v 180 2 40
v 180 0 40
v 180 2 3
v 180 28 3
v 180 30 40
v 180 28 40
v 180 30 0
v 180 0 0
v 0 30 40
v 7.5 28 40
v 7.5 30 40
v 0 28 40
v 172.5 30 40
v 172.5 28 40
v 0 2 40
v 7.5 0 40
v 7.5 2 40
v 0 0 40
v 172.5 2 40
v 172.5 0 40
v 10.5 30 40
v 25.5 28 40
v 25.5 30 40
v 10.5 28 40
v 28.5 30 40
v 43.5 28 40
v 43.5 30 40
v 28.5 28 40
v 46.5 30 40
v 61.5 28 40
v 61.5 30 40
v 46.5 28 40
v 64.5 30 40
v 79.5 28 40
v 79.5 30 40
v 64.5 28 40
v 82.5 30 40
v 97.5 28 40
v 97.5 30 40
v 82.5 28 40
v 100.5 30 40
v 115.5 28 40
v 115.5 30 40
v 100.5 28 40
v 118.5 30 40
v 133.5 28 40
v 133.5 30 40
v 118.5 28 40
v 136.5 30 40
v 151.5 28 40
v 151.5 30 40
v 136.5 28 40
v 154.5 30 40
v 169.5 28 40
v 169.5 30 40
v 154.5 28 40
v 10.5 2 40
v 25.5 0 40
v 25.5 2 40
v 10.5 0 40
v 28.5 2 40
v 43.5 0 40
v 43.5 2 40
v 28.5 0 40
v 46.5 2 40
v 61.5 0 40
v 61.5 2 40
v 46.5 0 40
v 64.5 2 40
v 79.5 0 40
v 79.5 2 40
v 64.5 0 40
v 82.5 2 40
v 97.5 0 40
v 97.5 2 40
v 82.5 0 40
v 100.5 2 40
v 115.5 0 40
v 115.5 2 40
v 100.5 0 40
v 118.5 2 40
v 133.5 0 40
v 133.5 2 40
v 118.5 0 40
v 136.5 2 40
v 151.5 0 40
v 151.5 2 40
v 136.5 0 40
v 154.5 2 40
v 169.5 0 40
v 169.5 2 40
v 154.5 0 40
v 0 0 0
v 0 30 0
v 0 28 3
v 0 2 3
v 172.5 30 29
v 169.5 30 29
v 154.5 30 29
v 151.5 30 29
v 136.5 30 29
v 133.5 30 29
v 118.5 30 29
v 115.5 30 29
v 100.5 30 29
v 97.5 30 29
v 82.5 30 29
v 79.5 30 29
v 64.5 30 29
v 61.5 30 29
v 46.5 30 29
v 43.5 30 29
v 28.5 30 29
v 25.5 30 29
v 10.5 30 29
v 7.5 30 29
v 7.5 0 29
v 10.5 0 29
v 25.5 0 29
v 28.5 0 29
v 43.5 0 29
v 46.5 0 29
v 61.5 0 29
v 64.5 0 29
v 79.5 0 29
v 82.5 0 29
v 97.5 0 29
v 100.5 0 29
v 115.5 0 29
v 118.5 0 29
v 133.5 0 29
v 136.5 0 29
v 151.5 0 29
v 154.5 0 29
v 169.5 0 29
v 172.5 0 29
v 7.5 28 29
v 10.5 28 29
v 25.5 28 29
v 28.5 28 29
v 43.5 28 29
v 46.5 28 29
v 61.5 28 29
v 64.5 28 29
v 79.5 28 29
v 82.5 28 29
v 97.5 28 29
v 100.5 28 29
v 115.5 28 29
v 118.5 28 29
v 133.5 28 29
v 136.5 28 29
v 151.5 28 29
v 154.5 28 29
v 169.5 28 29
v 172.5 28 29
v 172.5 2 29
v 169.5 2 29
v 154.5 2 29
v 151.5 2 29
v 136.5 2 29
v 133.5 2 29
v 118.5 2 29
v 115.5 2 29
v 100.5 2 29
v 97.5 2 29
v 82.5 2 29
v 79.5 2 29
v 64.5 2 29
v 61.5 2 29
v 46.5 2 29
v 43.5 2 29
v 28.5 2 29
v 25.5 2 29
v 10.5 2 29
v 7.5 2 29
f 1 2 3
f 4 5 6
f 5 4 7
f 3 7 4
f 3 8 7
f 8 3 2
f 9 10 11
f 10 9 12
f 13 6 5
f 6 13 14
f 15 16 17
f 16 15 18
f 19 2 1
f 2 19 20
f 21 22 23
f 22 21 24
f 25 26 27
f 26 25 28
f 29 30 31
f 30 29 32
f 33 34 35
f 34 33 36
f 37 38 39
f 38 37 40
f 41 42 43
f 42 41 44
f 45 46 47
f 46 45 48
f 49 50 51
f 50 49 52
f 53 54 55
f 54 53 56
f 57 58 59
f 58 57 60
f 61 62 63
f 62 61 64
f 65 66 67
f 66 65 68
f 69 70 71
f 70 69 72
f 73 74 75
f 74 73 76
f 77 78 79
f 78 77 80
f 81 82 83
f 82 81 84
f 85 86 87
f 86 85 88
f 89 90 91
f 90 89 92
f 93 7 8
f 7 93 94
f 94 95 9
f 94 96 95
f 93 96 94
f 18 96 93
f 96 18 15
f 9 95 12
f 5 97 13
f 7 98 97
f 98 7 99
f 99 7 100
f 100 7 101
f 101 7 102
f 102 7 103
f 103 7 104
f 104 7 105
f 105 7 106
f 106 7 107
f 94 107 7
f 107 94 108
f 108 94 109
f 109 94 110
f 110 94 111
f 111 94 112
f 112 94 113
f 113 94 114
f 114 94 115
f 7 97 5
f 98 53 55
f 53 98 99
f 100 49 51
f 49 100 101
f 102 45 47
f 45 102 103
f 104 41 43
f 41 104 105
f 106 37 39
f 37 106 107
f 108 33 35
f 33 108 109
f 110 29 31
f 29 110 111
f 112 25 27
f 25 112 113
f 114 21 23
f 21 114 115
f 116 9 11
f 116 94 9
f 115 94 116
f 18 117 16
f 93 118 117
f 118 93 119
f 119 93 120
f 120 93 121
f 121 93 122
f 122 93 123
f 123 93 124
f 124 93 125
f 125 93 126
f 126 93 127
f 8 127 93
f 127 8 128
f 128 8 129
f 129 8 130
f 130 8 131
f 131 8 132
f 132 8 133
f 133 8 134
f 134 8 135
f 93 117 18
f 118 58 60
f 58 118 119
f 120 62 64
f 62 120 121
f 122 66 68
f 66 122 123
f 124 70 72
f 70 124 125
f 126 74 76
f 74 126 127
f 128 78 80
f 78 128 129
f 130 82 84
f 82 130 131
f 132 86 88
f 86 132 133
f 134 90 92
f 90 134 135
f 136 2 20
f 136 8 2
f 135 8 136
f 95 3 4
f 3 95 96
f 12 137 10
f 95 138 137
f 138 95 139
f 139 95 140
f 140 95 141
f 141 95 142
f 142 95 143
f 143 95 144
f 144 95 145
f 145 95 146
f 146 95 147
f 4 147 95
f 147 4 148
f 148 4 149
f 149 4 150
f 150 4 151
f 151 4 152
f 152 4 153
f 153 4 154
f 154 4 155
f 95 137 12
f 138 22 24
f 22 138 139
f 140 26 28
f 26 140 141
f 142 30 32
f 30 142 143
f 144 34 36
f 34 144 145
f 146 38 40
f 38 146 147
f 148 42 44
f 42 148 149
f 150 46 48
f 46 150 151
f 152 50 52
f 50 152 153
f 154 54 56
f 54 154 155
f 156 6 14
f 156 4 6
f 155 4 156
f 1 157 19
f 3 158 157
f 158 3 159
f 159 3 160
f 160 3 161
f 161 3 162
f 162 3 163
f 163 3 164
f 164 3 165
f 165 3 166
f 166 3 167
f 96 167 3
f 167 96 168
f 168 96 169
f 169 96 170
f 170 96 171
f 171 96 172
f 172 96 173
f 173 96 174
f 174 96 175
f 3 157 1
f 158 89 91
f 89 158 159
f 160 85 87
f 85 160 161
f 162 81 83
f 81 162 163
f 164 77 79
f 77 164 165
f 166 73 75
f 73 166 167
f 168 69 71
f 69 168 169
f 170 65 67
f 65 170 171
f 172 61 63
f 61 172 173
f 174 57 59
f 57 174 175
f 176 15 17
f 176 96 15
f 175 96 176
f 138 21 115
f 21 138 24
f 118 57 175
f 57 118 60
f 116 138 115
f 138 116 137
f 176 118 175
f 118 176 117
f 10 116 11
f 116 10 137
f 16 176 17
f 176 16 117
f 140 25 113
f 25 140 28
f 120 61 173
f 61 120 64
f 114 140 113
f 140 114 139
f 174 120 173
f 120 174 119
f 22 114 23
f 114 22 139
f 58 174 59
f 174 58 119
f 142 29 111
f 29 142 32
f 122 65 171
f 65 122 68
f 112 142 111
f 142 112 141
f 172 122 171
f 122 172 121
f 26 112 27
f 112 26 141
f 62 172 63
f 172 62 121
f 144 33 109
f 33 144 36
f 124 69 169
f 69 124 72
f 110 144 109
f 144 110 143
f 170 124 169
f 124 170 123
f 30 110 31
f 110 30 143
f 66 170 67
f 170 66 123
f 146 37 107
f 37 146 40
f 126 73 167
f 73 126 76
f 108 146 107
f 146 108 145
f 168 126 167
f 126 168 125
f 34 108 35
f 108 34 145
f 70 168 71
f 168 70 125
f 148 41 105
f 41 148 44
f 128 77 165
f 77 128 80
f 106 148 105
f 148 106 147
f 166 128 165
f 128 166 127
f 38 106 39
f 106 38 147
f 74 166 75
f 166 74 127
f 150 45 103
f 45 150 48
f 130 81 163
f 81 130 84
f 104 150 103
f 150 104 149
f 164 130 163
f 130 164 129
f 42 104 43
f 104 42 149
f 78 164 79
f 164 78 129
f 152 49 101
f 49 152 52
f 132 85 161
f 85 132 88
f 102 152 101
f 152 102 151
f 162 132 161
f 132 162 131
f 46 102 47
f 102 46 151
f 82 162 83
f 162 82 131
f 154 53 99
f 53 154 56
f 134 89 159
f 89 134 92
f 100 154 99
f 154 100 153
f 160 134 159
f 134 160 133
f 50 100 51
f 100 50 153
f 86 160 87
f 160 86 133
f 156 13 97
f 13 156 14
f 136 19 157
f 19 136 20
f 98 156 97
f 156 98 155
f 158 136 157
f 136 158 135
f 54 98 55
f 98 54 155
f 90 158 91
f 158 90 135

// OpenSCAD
$fn = 32;

// ----------------------------------------------------------------------
// Cable duct: 180 x 30 x 40 mm, 10 fingers
// ----------------------------------------------------------------------

// --- parameters (mm) ---
tray_len = 180;           // duct length, X
tray_w = 30;              // duct width, Y
tray_h = 40;              // duct height, Z
tray_t = 2;               // side wall thickness
floor_t = 3;              // floor thickness
slot_w = 3;               // finger slot width
slot_h = 26;              // finger slot height
fingers = 10;             // number of finger slots per side
pitch = 18;               // finger pitch

module shell() {
  difference() {
    cube([tray_len, tray_w, tray_h]);
    /* open top channel */
    translate([-tray_t - 1, tray_t, floor_t])
      cube([tray_len + 2 * tray_t + 2, tray_w - 2 * tray_t, tray_h + 1]);
  }
}

difference() {
  union() {
    shell();
  }
  /* finger slots cut through both side walls */
  for (i = [0 : fingers - 1]) translate([pitch / 2 + i * pitch - slot_w / 2, -1, floor_t + slot_h]) cube([slot_w, tray_w + 2, tray_h]);
}
